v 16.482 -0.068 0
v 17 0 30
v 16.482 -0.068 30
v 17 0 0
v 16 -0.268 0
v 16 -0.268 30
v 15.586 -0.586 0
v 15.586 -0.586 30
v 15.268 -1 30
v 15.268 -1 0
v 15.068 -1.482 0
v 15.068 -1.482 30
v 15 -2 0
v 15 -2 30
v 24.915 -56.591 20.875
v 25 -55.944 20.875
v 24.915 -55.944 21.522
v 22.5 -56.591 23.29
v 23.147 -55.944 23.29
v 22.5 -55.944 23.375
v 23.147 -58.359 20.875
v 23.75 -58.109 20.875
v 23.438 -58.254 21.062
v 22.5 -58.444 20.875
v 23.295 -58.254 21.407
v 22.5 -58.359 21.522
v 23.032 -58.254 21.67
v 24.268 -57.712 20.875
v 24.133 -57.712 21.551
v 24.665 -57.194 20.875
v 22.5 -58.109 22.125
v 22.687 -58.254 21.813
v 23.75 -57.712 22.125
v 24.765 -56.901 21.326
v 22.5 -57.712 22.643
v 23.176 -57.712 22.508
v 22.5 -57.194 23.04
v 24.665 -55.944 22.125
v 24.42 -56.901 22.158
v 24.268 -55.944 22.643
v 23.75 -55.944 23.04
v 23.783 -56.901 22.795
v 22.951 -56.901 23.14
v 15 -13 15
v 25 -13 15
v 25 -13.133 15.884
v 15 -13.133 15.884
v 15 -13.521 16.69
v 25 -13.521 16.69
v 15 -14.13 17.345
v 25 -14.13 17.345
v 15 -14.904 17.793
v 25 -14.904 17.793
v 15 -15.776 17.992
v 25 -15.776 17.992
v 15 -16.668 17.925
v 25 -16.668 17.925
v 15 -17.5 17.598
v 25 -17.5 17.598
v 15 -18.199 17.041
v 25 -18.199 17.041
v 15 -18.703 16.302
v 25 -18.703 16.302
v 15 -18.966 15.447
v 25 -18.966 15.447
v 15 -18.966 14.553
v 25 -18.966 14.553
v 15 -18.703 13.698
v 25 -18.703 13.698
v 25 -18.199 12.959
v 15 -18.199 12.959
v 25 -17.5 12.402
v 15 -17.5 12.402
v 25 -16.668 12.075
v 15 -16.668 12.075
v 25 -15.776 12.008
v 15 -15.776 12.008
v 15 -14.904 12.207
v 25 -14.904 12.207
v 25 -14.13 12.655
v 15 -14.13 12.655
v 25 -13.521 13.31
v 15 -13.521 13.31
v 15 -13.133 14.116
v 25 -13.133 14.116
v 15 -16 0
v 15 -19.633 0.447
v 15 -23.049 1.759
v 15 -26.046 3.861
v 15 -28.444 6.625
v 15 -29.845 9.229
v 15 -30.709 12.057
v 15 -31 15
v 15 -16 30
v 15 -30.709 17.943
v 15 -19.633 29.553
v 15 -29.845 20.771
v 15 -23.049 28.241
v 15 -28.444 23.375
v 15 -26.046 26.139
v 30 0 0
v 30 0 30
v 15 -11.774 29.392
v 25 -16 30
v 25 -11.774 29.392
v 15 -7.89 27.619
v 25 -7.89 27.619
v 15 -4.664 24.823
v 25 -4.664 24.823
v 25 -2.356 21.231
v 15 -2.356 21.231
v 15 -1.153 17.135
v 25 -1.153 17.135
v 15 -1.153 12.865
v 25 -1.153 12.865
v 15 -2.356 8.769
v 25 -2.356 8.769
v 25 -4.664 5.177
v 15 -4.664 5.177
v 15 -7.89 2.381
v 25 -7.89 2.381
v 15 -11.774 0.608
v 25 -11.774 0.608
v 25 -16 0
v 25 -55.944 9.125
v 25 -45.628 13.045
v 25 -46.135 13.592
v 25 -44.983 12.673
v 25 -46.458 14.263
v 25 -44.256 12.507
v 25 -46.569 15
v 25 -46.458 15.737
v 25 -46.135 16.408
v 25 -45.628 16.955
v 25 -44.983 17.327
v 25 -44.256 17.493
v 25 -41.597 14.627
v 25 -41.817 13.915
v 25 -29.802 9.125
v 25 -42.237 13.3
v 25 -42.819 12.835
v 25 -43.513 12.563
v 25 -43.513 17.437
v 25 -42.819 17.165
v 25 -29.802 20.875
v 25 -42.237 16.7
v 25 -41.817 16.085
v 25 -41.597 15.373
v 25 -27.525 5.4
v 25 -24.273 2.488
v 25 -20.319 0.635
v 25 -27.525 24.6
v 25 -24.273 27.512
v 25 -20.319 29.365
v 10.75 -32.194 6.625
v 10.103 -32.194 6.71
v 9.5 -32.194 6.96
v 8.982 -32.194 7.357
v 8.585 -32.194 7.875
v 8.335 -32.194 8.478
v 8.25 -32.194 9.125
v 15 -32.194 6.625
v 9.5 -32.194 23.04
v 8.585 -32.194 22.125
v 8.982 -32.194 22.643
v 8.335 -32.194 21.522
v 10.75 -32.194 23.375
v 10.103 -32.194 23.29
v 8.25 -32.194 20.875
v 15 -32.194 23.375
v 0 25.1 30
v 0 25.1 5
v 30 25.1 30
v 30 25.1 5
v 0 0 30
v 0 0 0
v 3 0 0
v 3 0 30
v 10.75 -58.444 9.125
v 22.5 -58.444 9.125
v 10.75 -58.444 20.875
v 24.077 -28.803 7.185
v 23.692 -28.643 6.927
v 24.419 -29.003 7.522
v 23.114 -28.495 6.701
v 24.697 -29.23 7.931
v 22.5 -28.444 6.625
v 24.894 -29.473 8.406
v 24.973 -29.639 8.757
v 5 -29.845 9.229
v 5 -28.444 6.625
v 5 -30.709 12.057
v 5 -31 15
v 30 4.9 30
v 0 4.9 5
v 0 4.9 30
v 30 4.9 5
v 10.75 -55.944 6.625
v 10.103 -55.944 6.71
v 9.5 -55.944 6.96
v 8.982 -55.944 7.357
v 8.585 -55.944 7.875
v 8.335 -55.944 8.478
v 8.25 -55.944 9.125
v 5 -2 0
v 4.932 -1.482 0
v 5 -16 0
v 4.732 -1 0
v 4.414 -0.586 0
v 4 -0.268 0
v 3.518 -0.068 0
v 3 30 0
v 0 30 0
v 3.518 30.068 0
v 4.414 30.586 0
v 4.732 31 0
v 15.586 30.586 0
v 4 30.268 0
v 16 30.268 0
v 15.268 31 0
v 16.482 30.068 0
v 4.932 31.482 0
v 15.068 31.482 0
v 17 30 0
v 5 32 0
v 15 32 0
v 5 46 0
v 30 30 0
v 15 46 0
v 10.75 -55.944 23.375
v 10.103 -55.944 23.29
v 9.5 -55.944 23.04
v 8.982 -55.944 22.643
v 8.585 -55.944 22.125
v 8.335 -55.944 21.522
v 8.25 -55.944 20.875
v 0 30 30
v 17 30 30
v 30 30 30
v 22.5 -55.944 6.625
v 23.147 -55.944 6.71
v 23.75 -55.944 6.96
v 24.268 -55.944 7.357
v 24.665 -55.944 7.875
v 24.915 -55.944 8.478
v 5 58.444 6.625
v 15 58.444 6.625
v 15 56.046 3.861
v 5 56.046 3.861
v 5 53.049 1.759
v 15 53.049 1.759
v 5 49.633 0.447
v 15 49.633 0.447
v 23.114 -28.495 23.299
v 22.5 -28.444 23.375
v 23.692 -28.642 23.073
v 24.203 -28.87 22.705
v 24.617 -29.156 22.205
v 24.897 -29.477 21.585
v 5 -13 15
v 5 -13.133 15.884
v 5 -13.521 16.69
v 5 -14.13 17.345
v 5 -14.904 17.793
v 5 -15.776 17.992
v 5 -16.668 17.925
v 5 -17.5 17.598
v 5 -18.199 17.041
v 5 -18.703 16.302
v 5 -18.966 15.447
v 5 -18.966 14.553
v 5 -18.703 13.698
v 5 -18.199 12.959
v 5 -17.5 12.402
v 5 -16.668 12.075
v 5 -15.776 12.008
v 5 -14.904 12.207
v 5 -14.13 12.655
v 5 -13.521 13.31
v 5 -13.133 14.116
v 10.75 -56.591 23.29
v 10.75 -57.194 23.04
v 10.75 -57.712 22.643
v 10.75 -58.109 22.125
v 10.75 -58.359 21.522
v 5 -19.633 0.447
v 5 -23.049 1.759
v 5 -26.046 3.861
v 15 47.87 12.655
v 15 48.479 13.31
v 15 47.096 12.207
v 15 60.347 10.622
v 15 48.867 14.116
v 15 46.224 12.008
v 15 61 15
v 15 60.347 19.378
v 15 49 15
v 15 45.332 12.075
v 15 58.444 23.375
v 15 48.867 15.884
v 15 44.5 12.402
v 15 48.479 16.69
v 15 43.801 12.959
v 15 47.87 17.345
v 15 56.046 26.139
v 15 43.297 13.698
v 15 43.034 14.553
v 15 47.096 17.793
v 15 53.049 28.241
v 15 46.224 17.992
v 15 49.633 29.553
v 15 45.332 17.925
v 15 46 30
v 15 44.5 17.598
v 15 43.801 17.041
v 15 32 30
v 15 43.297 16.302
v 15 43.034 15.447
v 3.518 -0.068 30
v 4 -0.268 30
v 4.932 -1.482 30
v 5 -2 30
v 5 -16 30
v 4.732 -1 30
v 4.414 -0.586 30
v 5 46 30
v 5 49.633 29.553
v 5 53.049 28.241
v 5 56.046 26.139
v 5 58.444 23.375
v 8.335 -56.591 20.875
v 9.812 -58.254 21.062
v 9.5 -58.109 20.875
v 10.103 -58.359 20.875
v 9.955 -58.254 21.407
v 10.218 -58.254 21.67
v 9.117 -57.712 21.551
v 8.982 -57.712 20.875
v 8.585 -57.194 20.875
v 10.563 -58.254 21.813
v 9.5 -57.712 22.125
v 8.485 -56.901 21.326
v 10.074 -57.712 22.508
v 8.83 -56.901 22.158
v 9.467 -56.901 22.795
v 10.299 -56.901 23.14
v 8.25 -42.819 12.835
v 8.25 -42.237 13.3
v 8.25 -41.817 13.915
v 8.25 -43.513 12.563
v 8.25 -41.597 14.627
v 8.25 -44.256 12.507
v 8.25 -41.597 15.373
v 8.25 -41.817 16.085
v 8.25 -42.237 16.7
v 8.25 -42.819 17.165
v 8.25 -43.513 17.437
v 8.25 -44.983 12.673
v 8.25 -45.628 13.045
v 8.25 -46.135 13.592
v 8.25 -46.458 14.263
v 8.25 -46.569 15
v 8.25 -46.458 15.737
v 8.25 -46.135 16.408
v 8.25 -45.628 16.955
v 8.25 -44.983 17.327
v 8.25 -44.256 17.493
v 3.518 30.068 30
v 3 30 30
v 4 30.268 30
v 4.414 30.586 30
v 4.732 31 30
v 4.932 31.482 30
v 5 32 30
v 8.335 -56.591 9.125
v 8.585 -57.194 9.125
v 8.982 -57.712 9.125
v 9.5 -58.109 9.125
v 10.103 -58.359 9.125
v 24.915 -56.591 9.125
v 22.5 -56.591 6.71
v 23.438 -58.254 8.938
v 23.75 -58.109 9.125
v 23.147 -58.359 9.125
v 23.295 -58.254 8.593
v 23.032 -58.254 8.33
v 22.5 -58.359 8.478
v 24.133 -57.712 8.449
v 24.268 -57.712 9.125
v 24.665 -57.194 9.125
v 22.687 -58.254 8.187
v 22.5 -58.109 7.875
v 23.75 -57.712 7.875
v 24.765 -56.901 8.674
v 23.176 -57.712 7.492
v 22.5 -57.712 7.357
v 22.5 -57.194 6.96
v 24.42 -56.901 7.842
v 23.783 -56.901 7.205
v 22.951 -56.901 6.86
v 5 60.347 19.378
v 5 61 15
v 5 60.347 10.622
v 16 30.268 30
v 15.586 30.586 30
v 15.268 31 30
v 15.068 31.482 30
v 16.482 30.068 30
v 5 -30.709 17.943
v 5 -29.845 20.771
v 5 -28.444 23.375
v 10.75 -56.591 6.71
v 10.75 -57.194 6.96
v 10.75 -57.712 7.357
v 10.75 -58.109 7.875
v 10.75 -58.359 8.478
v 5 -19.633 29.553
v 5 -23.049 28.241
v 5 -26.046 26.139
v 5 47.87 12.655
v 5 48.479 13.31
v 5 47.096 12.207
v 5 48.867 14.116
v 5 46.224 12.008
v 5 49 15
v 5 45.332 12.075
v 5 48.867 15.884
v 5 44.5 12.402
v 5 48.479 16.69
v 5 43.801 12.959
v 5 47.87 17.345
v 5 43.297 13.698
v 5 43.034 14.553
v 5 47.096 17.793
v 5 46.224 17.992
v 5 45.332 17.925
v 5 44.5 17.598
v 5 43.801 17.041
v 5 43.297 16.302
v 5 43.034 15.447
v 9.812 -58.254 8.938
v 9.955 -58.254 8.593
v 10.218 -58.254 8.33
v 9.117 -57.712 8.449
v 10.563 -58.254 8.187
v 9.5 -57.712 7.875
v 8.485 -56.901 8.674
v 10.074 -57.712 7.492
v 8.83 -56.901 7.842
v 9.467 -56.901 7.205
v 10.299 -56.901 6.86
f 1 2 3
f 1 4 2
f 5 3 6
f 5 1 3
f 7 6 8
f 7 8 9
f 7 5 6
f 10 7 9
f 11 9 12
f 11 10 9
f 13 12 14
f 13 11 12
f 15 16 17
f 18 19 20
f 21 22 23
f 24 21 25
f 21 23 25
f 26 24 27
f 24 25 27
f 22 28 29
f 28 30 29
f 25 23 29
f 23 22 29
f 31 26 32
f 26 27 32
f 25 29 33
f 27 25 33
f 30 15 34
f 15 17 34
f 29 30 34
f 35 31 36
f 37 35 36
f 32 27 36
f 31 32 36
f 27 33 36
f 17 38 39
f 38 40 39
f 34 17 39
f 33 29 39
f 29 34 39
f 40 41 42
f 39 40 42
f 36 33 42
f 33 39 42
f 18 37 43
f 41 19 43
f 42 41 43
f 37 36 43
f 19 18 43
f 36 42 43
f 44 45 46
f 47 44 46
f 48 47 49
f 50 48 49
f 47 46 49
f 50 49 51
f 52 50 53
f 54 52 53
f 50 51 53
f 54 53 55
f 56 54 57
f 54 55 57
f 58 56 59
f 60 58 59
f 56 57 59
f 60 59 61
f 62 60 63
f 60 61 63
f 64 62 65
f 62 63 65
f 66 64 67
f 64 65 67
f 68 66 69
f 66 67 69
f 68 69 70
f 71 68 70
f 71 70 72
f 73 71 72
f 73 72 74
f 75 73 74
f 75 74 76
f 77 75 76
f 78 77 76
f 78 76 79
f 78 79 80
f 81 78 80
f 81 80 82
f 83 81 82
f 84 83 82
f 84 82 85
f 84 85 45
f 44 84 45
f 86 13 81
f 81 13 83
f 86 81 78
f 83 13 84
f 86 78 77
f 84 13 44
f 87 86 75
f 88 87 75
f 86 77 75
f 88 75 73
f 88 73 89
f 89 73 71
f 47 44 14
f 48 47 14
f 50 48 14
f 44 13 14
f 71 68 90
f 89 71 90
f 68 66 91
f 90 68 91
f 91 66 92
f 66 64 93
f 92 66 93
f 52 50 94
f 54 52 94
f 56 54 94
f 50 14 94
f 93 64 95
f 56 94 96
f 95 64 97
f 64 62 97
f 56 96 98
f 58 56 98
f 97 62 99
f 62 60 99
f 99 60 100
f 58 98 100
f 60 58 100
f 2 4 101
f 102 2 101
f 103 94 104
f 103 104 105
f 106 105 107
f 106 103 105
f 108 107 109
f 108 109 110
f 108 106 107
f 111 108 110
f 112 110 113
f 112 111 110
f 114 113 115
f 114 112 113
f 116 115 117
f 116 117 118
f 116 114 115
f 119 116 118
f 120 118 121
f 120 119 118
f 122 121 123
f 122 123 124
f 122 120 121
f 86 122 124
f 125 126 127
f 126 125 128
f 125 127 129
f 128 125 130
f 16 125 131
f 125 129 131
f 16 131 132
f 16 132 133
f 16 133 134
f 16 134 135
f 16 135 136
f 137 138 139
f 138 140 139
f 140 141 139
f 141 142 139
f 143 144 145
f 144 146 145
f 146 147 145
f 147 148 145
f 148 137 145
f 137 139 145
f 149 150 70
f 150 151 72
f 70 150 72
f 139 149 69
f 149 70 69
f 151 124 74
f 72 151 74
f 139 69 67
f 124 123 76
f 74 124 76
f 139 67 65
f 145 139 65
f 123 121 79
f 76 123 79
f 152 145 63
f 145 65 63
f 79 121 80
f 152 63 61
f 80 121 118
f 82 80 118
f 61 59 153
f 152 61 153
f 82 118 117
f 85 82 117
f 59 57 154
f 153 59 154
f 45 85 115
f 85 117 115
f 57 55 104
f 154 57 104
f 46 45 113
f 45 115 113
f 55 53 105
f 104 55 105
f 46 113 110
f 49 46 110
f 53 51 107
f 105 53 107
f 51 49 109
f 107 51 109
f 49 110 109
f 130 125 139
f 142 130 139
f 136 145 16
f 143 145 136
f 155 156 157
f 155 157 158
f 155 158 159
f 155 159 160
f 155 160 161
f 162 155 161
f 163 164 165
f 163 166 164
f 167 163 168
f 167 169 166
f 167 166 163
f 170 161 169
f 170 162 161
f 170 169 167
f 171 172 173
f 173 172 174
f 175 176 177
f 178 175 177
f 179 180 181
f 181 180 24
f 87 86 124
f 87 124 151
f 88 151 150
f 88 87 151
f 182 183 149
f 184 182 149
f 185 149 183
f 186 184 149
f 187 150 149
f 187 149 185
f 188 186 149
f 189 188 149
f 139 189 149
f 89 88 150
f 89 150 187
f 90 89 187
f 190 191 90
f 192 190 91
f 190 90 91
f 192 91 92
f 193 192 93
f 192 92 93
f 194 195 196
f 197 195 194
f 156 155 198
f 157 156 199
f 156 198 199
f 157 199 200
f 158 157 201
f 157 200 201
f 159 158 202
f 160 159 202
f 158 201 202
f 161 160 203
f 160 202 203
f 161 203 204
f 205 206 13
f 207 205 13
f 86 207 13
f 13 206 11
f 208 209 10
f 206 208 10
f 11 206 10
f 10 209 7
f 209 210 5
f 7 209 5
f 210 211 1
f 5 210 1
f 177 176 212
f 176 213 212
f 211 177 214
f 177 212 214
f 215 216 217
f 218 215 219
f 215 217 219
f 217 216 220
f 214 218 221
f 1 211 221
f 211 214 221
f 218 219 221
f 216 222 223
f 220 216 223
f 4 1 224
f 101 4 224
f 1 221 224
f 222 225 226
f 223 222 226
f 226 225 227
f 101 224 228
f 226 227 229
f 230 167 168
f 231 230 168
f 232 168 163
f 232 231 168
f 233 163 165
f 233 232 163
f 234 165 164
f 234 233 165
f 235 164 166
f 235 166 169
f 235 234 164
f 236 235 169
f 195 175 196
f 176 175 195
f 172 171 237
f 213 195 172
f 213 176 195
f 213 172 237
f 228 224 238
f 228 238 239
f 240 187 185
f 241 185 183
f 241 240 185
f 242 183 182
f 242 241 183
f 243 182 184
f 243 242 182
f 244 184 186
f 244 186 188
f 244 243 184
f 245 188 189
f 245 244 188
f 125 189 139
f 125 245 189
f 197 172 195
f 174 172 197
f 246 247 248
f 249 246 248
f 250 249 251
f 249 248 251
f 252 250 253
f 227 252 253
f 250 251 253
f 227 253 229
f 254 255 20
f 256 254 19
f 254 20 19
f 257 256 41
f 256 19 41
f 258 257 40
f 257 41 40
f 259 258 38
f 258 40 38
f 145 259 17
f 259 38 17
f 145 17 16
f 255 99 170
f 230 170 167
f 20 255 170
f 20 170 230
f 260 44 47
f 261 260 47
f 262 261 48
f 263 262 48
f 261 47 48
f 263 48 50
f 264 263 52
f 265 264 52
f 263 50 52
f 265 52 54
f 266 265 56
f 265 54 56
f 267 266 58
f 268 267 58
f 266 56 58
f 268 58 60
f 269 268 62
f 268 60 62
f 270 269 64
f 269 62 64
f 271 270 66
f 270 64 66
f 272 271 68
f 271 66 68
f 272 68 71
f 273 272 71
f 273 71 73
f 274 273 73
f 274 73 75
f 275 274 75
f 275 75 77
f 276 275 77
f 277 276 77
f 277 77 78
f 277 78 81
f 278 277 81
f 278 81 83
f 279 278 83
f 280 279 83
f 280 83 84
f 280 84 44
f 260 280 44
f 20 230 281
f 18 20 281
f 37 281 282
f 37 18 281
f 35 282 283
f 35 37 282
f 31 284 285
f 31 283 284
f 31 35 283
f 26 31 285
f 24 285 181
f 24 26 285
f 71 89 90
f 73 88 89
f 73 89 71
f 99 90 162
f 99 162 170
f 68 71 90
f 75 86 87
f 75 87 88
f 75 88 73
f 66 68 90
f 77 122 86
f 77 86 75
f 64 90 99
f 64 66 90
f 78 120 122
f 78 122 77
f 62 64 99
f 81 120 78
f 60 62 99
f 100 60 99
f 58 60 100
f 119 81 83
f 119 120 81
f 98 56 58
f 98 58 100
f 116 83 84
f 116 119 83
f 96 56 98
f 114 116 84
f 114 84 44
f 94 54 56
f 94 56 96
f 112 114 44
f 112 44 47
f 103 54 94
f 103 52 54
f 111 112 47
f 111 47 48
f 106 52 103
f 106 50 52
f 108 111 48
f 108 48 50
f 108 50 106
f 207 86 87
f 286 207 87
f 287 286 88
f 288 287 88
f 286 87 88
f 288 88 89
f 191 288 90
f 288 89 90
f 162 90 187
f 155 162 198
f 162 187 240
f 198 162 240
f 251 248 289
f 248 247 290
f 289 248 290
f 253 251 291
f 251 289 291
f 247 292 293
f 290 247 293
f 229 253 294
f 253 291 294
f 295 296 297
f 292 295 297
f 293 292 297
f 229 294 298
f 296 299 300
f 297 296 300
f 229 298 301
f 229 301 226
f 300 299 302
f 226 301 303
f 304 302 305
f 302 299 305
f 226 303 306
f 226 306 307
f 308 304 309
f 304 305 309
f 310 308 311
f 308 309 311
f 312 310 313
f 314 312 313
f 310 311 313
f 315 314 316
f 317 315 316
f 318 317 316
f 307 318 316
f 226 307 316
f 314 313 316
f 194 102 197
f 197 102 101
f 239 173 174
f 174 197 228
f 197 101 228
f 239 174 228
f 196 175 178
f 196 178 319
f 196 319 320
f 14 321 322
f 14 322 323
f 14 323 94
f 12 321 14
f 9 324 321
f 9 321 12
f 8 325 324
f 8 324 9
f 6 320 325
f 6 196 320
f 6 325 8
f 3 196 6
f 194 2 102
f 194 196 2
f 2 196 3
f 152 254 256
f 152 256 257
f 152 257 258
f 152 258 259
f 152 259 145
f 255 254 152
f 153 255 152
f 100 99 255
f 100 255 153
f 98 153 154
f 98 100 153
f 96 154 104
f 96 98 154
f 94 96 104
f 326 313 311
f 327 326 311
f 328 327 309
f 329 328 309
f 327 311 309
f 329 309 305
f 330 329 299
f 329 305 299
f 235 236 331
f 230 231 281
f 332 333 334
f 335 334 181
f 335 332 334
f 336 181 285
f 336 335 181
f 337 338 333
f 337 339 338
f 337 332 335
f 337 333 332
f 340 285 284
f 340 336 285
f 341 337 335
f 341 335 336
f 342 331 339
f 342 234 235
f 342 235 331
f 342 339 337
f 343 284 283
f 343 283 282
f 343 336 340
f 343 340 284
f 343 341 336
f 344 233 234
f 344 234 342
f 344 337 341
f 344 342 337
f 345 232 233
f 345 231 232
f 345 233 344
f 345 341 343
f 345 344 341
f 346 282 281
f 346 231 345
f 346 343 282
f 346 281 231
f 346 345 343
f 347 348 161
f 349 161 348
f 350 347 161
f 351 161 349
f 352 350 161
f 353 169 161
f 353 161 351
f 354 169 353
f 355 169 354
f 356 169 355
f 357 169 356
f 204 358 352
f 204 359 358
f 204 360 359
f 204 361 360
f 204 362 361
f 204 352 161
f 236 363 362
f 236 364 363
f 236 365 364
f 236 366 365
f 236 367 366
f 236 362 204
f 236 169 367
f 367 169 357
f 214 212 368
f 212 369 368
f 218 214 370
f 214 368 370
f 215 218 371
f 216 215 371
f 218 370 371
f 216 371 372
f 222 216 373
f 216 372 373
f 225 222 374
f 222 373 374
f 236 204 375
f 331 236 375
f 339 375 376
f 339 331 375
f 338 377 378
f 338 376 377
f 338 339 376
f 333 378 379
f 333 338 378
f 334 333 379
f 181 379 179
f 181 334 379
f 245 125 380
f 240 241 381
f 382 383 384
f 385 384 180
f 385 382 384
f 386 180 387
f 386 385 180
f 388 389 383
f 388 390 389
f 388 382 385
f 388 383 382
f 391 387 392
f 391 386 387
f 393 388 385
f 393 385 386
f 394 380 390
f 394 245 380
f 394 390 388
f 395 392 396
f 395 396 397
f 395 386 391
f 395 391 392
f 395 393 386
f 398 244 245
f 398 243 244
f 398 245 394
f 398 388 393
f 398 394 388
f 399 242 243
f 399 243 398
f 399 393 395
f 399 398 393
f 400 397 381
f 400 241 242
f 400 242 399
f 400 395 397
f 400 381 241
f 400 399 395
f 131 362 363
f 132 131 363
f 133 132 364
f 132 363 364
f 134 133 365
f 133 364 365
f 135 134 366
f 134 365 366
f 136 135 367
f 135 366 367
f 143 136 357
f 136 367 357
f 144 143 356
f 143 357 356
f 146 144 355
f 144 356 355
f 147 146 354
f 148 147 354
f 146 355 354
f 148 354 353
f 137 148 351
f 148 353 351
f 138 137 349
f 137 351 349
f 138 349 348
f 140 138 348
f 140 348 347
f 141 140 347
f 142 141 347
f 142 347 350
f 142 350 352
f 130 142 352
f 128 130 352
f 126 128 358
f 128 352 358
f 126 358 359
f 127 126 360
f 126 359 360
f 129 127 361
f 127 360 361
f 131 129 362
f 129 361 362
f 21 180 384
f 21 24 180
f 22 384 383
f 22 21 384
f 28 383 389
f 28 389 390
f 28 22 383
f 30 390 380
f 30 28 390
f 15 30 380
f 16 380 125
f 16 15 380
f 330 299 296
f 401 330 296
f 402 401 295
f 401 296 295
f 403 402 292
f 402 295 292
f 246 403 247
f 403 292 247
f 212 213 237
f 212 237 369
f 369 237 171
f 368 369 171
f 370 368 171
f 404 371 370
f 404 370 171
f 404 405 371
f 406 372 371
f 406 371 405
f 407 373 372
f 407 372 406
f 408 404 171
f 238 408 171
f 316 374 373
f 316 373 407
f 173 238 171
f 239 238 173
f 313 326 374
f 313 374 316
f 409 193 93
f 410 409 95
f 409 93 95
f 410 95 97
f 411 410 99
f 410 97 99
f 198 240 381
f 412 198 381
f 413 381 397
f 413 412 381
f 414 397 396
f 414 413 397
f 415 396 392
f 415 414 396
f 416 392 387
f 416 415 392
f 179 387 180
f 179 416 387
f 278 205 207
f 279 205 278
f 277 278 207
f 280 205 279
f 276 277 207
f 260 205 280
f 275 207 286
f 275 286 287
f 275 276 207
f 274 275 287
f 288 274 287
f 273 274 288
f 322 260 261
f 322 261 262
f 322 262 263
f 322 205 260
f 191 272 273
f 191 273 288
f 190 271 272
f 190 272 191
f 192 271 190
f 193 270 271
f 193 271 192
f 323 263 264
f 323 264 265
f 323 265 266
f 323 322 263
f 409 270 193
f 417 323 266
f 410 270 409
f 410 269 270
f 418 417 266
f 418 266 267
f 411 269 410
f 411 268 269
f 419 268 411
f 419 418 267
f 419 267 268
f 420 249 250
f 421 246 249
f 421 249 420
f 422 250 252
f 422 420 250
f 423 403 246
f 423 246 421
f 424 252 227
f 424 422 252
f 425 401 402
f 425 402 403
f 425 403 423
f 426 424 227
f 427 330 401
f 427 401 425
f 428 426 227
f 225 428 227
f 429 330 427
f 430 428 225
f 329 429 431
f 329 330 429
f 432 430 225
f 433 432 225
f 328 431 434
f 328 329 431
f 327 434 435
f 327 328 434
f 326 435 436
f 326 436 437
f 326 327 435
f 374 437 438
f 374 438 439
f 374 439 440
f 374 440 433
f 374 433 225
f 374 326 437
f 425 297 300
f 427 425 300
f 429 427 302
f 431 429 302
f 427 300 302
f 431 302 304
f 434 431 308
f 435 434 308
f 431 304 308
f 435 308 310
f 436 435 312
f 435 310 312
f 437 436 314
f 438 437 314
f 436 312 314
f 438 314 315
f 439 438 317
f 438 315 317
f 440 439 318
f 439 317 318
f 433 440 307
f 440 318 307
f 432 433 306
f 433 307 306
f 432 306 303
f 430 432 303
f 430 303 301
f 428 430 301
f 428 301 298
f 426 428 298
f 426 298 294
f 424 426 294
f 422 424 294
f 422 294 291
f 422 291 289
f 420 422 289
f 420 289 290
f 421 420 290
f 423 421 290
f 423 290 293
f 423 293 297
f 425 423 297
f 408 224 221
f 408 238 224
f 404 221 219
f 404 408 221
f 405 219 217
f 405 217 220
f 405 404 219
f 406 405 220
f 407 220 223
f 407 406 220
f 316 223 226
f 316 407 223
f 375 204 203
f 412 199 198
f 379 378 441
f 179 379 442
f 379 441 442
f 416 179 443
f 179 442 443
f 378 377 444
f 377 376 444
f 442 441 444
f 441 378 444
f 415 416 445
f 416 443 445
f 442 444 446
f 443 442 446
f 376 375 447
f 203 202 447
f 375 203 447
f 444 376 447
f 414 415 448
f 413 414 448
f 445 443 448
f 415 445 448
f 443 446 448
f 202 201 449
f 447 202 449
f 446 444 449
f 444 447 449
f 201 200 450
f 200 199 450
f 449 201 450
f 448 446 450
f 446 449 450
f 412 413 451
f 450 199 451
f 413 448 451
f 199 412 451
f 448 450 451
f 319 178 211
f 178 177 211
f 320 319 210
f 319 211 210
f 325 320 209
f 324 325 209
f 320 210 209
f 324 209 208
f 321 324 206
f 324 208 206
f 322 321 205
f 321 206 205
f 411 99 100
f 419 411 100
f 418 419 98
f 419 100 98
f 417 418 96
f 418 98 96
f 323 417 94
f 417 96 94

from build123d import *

# Parameters (mm, degrees)
F1_W      = 30
F1_H      = 30
F2_DEPTH  = 5
F3_W      = 30
F3_H      = 4.9
F4_DEPTH  = 25
F8_DEPTH  = 10
F9_R      = 2
F10_DEPTH = 10
F11_DEPTH = 30
F12_W     = 26.25
F12_H     = 16.75
F13_DEPTH = 6.75
F14_R     = 3
F15_DEPTH = 25
F16_R     = 2.5
F17_R     = 2.5
F18_DEPTH = 16.75


with BuildPart() as f2:
    # F1 (on Top) → F2 (new body)
    with BuildSketch(Plane.XY):
        with Locations((15, 15)):
            Rectangle(F1_W, F1_H)
    extrude(amount=F2_DEPTH)

    # F3 (on face) → F4 (join)
    with BuildSketch(Plane.XY.offset(5)):
        with Locations((15, 27.55)):
            Rectangle(F3_W, F3_H)
        with Locations((15, 2.45)):
            Rectangle(F3_W, F3_H)
    extrude(amount=F4_DEPTH)

    # F7 (on line) → F8 (join)
    with BuildSketch(Plane(origin=(15, 0, 0), x_dir=(0, -1, 0), z_dir=(-1, 0, 0))):
        with BuildLine():
            Line((16, 30), (0, 30))
            Line((0, 30), (0, 0))
            Line((0, 0), (16, 0))
            ThreePointArc((16, 0), (1, 15), (16, 30))
        make_face()
        with BuildLine():
            ThreePointArc((28.4442506805, 23.375), (23.0489360899, 28.2405626769), (16, 30))
            Line((16, 30), (16, 23))
            Line((16, 23), (16, 7))
            Line((16, 7), (16, 0))
            ThreePointArc((16, 0), (23.0489360899, 1.7594373231), (28.4442506805, 6.625))
            Line((28.4442506805, 6.625), (28.4442506805, 23.375))
        make_face()
        with BuildLine():
            Line((16, 23), (16, 30))
            ThreePointArc((16, 30), (1, 15), (16, 0))
            Line((16, 0), (16, 7))
            Line((16, 7), (16, 23))
        make_face()
        with BuildLine():
            ThreePointArc((31, 15), (30.3468421649, 19.3781411462), (28.4442506805, 23.375))
            Line((28.4442506805, 23.375), (28.4442506805, 6.625))
            ThreePointArc((28.4442506805, 6.625), (30.3468421649, 10.6218588538), (31, 15))
        make_face()
        with BuildLine():
            Line((-46, 0), (-46, 30))
            ThreePointArc((-46, 30), (-53.0489360899, 28.2405626769), (-58.4442506805, 23.375))
            Line((-58.4442506805, 23.375), (-58.4442506805, 6.625))
            ThreePointArc((-58.4442506805, 6.625), (-53.0489360899, 1.7594373231), (-46, 0))
        make_face()
        with BuildLine():
            ThreePointArc((-31, 15), (-35.3933982822, 25.6066017178), (-46, 30))
            Line((-46, 30), (-46, 0))
            ThreePointArc((-46, 0), (-35.3933982822, 4.3933982822), (-31, 15))
        make_face()
        with BuildLine():
            Line((-30, 0), (-30, 30))
            Line((-30, 30), (-46, 30))
            ThreePointArc((-46, 30), (-35.3933982822, 25.6066017178), (-31, 15))
            ThreePointArc((-31, 15), (-35.3933982822, 4.3933982822), (-46, 0))
            Line((-46, 0), (-30, 0))
        make_face()
        with BuildLine():
            Line((-58.4442506805, 6.625), (-58.4442506805, 23.375))
            ThreePointArc((-58.4442506805, 23.375), (-61, 15), (-58.4442506805, 6.625))
        make_face()
    extrude(amount=F8_DEPTH)

    # F9
    f9_edges = [f2.edges().sort_by_distance(p)[0] for p in [
        (5, 0, 15),
        (15, 0, 15),
        (5, 30, 15),
        (15, 30, 15),
    ]]
    fillet(f9_edges, radius=F9_R)


with BuildPart() as f10:
    # F7 (on line) → F10 (new body)
    with BuildSketch(Plane(origin=(15, 0, 0), x_dir=(0, -1, 0), z_dir=(-1, 0, 0))):
        with BuildLine():
            Line((16, 23), (16, 30))
            ThreePointArc((16, 30), (1, 15), (16, 0))
            Line((16, 0), (16, 7))
            Line((16, 7), (16, 23))
        make_face()
        with BuildLine():
            ThreePointArc((28.4442506805, 23.375), (23.0489360899, 28.2405626769), (16, 30))
            Line((16, 30), (16, 23))
            Line((16, 23), (16, 7))
            Line((16, 7), (16, 0))
            ThreePointArc((16, 0), (23.0489360899, 1.7594373231), (28.4442506805, 6.625))
            Line((28.4442506805, 6.625), (28.4442506805, 23.375))
        make_face()
    extrude(amount=-F10_DEPTH)

    # F11 (add): a face of the model
    f11_faces = [f10.faces().sort_by_distance(p)[0] for p in [
        (20, -28.4442506805, 15),
    ]]
    extrude(f11_faces, amount=F11_DEPTH)

    # F12 (on face) → F13 (join)
    with BuildSketch(Plane(origin=(15, 0, 0), x_dir=(0, -1, 0), z_dir=(-1, 0, 0))):
        with Locations((45.3192506805, 15)):
            Rectangle(F12_W, F12_H)
    extrude(amount=F13_DEPTH)


with BuildPart() as f15_tool:
    # F14 (on face) → F15 (new body)
    with BuildSketch(Plane.YZ.offset(25)):
        with Locations((-16, 15)):
            Circle(F14_R)
        with Locations((46, 15)):
            Circle(F14_R)
    extrude(amount=-F15_DEPTH)


with BuildPart() as f2_1:
    add(f2.part)

    # F15: cut by f15_tool
    add(f15_tool.part, mode=Mode.SUBTRACT)


with BuildPart() as f10_1:
    add(f10.part)

    # F15: cut by f15_tool
    add(f15_tool.part, mode=Mode.SUBTRACT)

    # F16
    f16_edges = [f10_1.edges().sort_by_distance(p)[0] for p in [
        (8.25, -45.319251, 23.375),
        (8.25, -45.319251, 6.625),
        (25, -43.444251, 23.375),
        (25, -43.444251, 6.625),
        (25, -58.444251, 15),
        (8.25, -58.444251, 15),
        (16.625, -58.444251, 6.625),
        (16.625, -58.444251, 23.375),
    ]]
    fillet(f16_edges, radius=F16_R)

    # F17 (on face) → F18 (cut, through all)
    with BuildSketch(Plane(origin=(8.25, 0, 0), x_dir=(0, -1, 0), z_dir=(-1, 0, 0))):
        with Locations((44.0692506805, 15)):
            Circle(F17_R)
    extrude(amount=-F18_DEPTH, mode=Mode.SUBTRACT)


solid = Compound([f2_1.part, f10_1.part])
